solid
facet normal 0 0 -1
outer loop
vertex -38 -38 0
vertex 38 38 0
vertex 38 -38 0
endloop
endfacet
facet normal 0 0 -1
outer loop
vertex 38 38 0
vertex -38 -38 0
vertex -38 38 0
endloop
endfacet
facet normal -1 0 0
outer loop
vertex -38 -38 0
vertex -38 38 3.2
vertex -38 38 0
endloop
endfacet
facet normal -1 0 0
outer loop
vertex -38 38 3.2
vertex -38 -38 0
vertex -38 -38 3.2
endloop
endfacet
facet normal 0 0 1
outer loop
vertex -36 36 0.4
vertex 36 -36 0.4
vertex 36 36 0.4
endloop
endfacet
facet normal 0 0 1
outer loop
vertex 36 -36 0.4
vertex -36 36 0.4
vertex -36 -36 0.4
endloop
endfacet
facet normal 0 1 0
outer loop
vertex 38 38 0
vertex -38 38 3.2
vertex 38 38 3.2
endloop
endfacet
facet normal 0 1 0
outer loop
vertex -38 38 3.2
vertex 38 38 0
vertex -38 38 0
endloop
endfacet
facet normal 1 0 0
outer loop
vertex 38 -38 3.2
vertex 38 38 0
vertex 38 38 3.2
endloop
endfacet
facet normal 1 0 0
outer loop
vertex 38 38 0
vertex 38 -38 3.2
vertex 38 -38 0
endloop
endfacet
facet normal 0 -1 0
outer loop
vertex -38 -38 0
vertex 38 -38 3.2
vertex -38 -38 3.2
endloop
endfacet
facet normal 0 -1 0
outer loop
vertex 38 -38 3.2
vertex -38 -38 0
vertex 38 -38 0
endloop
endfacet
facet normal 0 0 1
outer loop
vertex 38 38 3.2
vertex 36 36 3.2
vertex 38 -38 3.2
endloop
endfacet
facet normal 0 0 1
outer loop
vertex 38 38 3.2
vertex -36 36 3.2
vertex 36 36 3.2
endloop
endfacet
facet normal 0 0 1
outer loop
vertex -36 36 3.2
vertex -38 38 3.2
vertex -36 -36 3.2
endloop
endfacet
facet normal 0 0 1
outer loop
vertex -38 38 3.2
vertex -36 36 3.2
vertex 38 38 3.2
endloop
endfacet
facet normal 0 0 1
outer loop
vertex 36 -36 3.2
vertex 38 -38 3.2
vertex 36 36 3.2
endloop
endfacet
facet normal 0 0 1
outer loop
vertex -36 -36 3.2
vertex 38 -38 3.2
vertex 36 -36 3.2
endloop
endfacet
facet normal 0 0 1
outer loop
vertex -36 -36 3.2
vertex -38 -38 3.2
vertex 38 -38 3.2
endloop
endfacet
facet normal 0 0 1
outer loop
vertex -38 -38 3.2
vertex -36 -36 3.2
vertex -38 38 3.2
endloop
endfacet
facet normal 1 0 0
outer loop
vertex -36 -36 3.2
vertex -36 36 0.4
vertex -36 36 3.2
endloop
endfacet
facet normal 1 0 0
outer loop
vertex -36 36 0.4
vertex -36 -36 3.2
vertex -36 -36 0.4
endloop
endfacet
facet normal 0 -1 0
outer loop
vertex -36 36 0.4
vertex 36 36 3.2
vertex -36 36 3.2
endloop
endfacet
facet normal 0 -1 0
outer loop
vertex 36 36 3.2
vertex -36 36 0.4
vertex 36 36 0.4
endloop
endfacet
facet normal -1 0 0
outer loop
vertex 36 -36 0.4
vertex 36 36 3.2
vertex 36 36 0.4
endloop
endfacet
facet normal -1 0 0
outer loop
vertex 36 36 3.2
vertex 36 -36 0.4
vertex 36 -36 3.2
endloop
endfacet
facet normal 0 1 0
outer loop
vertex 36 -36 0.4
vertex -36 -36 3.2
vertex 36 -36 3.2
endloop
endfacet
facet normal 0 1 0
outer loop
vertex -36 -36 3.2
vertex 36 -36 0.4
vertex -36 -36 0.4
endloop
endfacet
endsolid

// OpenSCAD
// preview[view:south, tilt:top]

/* [Image] */

// Simple photos with many shades of light/dark areas work best. Don't forget to click the Invert Colors checkbox!
image_file = "/Users/gustavo/Downloads/lithoplane.dat"; // [image_surface:72x72]
original_size = 128;

/* [Hidden] */

// What layer height will you slice this at?  The thinner the better.
layer_height = 0.2;

// base (white) will always be 2 layers thick
min_layer_height = layer_height*2;
height = 2.8;

lithopane(72, 72, 1, 1);

module lithopane(length, width, x_scale, y_scale) {
  union() {
    translate([0, 0, min_layer_height]) mirror([1, 0, 0]) mirror([0, 1, 0]) scale([length/original_size,width/original_size,height/256]) surface(file=image_file, center=true, convexity=5);
    linear_extrude(height=min_layer_height) square([length+4, width+4], center=true);

    linear_extrude(height=height+min_layer_height) {
  	  difference() {
          square([length+4, width+4], center=true);
          square([length, width], center=true);
  	  }
    }
    
  }
}
